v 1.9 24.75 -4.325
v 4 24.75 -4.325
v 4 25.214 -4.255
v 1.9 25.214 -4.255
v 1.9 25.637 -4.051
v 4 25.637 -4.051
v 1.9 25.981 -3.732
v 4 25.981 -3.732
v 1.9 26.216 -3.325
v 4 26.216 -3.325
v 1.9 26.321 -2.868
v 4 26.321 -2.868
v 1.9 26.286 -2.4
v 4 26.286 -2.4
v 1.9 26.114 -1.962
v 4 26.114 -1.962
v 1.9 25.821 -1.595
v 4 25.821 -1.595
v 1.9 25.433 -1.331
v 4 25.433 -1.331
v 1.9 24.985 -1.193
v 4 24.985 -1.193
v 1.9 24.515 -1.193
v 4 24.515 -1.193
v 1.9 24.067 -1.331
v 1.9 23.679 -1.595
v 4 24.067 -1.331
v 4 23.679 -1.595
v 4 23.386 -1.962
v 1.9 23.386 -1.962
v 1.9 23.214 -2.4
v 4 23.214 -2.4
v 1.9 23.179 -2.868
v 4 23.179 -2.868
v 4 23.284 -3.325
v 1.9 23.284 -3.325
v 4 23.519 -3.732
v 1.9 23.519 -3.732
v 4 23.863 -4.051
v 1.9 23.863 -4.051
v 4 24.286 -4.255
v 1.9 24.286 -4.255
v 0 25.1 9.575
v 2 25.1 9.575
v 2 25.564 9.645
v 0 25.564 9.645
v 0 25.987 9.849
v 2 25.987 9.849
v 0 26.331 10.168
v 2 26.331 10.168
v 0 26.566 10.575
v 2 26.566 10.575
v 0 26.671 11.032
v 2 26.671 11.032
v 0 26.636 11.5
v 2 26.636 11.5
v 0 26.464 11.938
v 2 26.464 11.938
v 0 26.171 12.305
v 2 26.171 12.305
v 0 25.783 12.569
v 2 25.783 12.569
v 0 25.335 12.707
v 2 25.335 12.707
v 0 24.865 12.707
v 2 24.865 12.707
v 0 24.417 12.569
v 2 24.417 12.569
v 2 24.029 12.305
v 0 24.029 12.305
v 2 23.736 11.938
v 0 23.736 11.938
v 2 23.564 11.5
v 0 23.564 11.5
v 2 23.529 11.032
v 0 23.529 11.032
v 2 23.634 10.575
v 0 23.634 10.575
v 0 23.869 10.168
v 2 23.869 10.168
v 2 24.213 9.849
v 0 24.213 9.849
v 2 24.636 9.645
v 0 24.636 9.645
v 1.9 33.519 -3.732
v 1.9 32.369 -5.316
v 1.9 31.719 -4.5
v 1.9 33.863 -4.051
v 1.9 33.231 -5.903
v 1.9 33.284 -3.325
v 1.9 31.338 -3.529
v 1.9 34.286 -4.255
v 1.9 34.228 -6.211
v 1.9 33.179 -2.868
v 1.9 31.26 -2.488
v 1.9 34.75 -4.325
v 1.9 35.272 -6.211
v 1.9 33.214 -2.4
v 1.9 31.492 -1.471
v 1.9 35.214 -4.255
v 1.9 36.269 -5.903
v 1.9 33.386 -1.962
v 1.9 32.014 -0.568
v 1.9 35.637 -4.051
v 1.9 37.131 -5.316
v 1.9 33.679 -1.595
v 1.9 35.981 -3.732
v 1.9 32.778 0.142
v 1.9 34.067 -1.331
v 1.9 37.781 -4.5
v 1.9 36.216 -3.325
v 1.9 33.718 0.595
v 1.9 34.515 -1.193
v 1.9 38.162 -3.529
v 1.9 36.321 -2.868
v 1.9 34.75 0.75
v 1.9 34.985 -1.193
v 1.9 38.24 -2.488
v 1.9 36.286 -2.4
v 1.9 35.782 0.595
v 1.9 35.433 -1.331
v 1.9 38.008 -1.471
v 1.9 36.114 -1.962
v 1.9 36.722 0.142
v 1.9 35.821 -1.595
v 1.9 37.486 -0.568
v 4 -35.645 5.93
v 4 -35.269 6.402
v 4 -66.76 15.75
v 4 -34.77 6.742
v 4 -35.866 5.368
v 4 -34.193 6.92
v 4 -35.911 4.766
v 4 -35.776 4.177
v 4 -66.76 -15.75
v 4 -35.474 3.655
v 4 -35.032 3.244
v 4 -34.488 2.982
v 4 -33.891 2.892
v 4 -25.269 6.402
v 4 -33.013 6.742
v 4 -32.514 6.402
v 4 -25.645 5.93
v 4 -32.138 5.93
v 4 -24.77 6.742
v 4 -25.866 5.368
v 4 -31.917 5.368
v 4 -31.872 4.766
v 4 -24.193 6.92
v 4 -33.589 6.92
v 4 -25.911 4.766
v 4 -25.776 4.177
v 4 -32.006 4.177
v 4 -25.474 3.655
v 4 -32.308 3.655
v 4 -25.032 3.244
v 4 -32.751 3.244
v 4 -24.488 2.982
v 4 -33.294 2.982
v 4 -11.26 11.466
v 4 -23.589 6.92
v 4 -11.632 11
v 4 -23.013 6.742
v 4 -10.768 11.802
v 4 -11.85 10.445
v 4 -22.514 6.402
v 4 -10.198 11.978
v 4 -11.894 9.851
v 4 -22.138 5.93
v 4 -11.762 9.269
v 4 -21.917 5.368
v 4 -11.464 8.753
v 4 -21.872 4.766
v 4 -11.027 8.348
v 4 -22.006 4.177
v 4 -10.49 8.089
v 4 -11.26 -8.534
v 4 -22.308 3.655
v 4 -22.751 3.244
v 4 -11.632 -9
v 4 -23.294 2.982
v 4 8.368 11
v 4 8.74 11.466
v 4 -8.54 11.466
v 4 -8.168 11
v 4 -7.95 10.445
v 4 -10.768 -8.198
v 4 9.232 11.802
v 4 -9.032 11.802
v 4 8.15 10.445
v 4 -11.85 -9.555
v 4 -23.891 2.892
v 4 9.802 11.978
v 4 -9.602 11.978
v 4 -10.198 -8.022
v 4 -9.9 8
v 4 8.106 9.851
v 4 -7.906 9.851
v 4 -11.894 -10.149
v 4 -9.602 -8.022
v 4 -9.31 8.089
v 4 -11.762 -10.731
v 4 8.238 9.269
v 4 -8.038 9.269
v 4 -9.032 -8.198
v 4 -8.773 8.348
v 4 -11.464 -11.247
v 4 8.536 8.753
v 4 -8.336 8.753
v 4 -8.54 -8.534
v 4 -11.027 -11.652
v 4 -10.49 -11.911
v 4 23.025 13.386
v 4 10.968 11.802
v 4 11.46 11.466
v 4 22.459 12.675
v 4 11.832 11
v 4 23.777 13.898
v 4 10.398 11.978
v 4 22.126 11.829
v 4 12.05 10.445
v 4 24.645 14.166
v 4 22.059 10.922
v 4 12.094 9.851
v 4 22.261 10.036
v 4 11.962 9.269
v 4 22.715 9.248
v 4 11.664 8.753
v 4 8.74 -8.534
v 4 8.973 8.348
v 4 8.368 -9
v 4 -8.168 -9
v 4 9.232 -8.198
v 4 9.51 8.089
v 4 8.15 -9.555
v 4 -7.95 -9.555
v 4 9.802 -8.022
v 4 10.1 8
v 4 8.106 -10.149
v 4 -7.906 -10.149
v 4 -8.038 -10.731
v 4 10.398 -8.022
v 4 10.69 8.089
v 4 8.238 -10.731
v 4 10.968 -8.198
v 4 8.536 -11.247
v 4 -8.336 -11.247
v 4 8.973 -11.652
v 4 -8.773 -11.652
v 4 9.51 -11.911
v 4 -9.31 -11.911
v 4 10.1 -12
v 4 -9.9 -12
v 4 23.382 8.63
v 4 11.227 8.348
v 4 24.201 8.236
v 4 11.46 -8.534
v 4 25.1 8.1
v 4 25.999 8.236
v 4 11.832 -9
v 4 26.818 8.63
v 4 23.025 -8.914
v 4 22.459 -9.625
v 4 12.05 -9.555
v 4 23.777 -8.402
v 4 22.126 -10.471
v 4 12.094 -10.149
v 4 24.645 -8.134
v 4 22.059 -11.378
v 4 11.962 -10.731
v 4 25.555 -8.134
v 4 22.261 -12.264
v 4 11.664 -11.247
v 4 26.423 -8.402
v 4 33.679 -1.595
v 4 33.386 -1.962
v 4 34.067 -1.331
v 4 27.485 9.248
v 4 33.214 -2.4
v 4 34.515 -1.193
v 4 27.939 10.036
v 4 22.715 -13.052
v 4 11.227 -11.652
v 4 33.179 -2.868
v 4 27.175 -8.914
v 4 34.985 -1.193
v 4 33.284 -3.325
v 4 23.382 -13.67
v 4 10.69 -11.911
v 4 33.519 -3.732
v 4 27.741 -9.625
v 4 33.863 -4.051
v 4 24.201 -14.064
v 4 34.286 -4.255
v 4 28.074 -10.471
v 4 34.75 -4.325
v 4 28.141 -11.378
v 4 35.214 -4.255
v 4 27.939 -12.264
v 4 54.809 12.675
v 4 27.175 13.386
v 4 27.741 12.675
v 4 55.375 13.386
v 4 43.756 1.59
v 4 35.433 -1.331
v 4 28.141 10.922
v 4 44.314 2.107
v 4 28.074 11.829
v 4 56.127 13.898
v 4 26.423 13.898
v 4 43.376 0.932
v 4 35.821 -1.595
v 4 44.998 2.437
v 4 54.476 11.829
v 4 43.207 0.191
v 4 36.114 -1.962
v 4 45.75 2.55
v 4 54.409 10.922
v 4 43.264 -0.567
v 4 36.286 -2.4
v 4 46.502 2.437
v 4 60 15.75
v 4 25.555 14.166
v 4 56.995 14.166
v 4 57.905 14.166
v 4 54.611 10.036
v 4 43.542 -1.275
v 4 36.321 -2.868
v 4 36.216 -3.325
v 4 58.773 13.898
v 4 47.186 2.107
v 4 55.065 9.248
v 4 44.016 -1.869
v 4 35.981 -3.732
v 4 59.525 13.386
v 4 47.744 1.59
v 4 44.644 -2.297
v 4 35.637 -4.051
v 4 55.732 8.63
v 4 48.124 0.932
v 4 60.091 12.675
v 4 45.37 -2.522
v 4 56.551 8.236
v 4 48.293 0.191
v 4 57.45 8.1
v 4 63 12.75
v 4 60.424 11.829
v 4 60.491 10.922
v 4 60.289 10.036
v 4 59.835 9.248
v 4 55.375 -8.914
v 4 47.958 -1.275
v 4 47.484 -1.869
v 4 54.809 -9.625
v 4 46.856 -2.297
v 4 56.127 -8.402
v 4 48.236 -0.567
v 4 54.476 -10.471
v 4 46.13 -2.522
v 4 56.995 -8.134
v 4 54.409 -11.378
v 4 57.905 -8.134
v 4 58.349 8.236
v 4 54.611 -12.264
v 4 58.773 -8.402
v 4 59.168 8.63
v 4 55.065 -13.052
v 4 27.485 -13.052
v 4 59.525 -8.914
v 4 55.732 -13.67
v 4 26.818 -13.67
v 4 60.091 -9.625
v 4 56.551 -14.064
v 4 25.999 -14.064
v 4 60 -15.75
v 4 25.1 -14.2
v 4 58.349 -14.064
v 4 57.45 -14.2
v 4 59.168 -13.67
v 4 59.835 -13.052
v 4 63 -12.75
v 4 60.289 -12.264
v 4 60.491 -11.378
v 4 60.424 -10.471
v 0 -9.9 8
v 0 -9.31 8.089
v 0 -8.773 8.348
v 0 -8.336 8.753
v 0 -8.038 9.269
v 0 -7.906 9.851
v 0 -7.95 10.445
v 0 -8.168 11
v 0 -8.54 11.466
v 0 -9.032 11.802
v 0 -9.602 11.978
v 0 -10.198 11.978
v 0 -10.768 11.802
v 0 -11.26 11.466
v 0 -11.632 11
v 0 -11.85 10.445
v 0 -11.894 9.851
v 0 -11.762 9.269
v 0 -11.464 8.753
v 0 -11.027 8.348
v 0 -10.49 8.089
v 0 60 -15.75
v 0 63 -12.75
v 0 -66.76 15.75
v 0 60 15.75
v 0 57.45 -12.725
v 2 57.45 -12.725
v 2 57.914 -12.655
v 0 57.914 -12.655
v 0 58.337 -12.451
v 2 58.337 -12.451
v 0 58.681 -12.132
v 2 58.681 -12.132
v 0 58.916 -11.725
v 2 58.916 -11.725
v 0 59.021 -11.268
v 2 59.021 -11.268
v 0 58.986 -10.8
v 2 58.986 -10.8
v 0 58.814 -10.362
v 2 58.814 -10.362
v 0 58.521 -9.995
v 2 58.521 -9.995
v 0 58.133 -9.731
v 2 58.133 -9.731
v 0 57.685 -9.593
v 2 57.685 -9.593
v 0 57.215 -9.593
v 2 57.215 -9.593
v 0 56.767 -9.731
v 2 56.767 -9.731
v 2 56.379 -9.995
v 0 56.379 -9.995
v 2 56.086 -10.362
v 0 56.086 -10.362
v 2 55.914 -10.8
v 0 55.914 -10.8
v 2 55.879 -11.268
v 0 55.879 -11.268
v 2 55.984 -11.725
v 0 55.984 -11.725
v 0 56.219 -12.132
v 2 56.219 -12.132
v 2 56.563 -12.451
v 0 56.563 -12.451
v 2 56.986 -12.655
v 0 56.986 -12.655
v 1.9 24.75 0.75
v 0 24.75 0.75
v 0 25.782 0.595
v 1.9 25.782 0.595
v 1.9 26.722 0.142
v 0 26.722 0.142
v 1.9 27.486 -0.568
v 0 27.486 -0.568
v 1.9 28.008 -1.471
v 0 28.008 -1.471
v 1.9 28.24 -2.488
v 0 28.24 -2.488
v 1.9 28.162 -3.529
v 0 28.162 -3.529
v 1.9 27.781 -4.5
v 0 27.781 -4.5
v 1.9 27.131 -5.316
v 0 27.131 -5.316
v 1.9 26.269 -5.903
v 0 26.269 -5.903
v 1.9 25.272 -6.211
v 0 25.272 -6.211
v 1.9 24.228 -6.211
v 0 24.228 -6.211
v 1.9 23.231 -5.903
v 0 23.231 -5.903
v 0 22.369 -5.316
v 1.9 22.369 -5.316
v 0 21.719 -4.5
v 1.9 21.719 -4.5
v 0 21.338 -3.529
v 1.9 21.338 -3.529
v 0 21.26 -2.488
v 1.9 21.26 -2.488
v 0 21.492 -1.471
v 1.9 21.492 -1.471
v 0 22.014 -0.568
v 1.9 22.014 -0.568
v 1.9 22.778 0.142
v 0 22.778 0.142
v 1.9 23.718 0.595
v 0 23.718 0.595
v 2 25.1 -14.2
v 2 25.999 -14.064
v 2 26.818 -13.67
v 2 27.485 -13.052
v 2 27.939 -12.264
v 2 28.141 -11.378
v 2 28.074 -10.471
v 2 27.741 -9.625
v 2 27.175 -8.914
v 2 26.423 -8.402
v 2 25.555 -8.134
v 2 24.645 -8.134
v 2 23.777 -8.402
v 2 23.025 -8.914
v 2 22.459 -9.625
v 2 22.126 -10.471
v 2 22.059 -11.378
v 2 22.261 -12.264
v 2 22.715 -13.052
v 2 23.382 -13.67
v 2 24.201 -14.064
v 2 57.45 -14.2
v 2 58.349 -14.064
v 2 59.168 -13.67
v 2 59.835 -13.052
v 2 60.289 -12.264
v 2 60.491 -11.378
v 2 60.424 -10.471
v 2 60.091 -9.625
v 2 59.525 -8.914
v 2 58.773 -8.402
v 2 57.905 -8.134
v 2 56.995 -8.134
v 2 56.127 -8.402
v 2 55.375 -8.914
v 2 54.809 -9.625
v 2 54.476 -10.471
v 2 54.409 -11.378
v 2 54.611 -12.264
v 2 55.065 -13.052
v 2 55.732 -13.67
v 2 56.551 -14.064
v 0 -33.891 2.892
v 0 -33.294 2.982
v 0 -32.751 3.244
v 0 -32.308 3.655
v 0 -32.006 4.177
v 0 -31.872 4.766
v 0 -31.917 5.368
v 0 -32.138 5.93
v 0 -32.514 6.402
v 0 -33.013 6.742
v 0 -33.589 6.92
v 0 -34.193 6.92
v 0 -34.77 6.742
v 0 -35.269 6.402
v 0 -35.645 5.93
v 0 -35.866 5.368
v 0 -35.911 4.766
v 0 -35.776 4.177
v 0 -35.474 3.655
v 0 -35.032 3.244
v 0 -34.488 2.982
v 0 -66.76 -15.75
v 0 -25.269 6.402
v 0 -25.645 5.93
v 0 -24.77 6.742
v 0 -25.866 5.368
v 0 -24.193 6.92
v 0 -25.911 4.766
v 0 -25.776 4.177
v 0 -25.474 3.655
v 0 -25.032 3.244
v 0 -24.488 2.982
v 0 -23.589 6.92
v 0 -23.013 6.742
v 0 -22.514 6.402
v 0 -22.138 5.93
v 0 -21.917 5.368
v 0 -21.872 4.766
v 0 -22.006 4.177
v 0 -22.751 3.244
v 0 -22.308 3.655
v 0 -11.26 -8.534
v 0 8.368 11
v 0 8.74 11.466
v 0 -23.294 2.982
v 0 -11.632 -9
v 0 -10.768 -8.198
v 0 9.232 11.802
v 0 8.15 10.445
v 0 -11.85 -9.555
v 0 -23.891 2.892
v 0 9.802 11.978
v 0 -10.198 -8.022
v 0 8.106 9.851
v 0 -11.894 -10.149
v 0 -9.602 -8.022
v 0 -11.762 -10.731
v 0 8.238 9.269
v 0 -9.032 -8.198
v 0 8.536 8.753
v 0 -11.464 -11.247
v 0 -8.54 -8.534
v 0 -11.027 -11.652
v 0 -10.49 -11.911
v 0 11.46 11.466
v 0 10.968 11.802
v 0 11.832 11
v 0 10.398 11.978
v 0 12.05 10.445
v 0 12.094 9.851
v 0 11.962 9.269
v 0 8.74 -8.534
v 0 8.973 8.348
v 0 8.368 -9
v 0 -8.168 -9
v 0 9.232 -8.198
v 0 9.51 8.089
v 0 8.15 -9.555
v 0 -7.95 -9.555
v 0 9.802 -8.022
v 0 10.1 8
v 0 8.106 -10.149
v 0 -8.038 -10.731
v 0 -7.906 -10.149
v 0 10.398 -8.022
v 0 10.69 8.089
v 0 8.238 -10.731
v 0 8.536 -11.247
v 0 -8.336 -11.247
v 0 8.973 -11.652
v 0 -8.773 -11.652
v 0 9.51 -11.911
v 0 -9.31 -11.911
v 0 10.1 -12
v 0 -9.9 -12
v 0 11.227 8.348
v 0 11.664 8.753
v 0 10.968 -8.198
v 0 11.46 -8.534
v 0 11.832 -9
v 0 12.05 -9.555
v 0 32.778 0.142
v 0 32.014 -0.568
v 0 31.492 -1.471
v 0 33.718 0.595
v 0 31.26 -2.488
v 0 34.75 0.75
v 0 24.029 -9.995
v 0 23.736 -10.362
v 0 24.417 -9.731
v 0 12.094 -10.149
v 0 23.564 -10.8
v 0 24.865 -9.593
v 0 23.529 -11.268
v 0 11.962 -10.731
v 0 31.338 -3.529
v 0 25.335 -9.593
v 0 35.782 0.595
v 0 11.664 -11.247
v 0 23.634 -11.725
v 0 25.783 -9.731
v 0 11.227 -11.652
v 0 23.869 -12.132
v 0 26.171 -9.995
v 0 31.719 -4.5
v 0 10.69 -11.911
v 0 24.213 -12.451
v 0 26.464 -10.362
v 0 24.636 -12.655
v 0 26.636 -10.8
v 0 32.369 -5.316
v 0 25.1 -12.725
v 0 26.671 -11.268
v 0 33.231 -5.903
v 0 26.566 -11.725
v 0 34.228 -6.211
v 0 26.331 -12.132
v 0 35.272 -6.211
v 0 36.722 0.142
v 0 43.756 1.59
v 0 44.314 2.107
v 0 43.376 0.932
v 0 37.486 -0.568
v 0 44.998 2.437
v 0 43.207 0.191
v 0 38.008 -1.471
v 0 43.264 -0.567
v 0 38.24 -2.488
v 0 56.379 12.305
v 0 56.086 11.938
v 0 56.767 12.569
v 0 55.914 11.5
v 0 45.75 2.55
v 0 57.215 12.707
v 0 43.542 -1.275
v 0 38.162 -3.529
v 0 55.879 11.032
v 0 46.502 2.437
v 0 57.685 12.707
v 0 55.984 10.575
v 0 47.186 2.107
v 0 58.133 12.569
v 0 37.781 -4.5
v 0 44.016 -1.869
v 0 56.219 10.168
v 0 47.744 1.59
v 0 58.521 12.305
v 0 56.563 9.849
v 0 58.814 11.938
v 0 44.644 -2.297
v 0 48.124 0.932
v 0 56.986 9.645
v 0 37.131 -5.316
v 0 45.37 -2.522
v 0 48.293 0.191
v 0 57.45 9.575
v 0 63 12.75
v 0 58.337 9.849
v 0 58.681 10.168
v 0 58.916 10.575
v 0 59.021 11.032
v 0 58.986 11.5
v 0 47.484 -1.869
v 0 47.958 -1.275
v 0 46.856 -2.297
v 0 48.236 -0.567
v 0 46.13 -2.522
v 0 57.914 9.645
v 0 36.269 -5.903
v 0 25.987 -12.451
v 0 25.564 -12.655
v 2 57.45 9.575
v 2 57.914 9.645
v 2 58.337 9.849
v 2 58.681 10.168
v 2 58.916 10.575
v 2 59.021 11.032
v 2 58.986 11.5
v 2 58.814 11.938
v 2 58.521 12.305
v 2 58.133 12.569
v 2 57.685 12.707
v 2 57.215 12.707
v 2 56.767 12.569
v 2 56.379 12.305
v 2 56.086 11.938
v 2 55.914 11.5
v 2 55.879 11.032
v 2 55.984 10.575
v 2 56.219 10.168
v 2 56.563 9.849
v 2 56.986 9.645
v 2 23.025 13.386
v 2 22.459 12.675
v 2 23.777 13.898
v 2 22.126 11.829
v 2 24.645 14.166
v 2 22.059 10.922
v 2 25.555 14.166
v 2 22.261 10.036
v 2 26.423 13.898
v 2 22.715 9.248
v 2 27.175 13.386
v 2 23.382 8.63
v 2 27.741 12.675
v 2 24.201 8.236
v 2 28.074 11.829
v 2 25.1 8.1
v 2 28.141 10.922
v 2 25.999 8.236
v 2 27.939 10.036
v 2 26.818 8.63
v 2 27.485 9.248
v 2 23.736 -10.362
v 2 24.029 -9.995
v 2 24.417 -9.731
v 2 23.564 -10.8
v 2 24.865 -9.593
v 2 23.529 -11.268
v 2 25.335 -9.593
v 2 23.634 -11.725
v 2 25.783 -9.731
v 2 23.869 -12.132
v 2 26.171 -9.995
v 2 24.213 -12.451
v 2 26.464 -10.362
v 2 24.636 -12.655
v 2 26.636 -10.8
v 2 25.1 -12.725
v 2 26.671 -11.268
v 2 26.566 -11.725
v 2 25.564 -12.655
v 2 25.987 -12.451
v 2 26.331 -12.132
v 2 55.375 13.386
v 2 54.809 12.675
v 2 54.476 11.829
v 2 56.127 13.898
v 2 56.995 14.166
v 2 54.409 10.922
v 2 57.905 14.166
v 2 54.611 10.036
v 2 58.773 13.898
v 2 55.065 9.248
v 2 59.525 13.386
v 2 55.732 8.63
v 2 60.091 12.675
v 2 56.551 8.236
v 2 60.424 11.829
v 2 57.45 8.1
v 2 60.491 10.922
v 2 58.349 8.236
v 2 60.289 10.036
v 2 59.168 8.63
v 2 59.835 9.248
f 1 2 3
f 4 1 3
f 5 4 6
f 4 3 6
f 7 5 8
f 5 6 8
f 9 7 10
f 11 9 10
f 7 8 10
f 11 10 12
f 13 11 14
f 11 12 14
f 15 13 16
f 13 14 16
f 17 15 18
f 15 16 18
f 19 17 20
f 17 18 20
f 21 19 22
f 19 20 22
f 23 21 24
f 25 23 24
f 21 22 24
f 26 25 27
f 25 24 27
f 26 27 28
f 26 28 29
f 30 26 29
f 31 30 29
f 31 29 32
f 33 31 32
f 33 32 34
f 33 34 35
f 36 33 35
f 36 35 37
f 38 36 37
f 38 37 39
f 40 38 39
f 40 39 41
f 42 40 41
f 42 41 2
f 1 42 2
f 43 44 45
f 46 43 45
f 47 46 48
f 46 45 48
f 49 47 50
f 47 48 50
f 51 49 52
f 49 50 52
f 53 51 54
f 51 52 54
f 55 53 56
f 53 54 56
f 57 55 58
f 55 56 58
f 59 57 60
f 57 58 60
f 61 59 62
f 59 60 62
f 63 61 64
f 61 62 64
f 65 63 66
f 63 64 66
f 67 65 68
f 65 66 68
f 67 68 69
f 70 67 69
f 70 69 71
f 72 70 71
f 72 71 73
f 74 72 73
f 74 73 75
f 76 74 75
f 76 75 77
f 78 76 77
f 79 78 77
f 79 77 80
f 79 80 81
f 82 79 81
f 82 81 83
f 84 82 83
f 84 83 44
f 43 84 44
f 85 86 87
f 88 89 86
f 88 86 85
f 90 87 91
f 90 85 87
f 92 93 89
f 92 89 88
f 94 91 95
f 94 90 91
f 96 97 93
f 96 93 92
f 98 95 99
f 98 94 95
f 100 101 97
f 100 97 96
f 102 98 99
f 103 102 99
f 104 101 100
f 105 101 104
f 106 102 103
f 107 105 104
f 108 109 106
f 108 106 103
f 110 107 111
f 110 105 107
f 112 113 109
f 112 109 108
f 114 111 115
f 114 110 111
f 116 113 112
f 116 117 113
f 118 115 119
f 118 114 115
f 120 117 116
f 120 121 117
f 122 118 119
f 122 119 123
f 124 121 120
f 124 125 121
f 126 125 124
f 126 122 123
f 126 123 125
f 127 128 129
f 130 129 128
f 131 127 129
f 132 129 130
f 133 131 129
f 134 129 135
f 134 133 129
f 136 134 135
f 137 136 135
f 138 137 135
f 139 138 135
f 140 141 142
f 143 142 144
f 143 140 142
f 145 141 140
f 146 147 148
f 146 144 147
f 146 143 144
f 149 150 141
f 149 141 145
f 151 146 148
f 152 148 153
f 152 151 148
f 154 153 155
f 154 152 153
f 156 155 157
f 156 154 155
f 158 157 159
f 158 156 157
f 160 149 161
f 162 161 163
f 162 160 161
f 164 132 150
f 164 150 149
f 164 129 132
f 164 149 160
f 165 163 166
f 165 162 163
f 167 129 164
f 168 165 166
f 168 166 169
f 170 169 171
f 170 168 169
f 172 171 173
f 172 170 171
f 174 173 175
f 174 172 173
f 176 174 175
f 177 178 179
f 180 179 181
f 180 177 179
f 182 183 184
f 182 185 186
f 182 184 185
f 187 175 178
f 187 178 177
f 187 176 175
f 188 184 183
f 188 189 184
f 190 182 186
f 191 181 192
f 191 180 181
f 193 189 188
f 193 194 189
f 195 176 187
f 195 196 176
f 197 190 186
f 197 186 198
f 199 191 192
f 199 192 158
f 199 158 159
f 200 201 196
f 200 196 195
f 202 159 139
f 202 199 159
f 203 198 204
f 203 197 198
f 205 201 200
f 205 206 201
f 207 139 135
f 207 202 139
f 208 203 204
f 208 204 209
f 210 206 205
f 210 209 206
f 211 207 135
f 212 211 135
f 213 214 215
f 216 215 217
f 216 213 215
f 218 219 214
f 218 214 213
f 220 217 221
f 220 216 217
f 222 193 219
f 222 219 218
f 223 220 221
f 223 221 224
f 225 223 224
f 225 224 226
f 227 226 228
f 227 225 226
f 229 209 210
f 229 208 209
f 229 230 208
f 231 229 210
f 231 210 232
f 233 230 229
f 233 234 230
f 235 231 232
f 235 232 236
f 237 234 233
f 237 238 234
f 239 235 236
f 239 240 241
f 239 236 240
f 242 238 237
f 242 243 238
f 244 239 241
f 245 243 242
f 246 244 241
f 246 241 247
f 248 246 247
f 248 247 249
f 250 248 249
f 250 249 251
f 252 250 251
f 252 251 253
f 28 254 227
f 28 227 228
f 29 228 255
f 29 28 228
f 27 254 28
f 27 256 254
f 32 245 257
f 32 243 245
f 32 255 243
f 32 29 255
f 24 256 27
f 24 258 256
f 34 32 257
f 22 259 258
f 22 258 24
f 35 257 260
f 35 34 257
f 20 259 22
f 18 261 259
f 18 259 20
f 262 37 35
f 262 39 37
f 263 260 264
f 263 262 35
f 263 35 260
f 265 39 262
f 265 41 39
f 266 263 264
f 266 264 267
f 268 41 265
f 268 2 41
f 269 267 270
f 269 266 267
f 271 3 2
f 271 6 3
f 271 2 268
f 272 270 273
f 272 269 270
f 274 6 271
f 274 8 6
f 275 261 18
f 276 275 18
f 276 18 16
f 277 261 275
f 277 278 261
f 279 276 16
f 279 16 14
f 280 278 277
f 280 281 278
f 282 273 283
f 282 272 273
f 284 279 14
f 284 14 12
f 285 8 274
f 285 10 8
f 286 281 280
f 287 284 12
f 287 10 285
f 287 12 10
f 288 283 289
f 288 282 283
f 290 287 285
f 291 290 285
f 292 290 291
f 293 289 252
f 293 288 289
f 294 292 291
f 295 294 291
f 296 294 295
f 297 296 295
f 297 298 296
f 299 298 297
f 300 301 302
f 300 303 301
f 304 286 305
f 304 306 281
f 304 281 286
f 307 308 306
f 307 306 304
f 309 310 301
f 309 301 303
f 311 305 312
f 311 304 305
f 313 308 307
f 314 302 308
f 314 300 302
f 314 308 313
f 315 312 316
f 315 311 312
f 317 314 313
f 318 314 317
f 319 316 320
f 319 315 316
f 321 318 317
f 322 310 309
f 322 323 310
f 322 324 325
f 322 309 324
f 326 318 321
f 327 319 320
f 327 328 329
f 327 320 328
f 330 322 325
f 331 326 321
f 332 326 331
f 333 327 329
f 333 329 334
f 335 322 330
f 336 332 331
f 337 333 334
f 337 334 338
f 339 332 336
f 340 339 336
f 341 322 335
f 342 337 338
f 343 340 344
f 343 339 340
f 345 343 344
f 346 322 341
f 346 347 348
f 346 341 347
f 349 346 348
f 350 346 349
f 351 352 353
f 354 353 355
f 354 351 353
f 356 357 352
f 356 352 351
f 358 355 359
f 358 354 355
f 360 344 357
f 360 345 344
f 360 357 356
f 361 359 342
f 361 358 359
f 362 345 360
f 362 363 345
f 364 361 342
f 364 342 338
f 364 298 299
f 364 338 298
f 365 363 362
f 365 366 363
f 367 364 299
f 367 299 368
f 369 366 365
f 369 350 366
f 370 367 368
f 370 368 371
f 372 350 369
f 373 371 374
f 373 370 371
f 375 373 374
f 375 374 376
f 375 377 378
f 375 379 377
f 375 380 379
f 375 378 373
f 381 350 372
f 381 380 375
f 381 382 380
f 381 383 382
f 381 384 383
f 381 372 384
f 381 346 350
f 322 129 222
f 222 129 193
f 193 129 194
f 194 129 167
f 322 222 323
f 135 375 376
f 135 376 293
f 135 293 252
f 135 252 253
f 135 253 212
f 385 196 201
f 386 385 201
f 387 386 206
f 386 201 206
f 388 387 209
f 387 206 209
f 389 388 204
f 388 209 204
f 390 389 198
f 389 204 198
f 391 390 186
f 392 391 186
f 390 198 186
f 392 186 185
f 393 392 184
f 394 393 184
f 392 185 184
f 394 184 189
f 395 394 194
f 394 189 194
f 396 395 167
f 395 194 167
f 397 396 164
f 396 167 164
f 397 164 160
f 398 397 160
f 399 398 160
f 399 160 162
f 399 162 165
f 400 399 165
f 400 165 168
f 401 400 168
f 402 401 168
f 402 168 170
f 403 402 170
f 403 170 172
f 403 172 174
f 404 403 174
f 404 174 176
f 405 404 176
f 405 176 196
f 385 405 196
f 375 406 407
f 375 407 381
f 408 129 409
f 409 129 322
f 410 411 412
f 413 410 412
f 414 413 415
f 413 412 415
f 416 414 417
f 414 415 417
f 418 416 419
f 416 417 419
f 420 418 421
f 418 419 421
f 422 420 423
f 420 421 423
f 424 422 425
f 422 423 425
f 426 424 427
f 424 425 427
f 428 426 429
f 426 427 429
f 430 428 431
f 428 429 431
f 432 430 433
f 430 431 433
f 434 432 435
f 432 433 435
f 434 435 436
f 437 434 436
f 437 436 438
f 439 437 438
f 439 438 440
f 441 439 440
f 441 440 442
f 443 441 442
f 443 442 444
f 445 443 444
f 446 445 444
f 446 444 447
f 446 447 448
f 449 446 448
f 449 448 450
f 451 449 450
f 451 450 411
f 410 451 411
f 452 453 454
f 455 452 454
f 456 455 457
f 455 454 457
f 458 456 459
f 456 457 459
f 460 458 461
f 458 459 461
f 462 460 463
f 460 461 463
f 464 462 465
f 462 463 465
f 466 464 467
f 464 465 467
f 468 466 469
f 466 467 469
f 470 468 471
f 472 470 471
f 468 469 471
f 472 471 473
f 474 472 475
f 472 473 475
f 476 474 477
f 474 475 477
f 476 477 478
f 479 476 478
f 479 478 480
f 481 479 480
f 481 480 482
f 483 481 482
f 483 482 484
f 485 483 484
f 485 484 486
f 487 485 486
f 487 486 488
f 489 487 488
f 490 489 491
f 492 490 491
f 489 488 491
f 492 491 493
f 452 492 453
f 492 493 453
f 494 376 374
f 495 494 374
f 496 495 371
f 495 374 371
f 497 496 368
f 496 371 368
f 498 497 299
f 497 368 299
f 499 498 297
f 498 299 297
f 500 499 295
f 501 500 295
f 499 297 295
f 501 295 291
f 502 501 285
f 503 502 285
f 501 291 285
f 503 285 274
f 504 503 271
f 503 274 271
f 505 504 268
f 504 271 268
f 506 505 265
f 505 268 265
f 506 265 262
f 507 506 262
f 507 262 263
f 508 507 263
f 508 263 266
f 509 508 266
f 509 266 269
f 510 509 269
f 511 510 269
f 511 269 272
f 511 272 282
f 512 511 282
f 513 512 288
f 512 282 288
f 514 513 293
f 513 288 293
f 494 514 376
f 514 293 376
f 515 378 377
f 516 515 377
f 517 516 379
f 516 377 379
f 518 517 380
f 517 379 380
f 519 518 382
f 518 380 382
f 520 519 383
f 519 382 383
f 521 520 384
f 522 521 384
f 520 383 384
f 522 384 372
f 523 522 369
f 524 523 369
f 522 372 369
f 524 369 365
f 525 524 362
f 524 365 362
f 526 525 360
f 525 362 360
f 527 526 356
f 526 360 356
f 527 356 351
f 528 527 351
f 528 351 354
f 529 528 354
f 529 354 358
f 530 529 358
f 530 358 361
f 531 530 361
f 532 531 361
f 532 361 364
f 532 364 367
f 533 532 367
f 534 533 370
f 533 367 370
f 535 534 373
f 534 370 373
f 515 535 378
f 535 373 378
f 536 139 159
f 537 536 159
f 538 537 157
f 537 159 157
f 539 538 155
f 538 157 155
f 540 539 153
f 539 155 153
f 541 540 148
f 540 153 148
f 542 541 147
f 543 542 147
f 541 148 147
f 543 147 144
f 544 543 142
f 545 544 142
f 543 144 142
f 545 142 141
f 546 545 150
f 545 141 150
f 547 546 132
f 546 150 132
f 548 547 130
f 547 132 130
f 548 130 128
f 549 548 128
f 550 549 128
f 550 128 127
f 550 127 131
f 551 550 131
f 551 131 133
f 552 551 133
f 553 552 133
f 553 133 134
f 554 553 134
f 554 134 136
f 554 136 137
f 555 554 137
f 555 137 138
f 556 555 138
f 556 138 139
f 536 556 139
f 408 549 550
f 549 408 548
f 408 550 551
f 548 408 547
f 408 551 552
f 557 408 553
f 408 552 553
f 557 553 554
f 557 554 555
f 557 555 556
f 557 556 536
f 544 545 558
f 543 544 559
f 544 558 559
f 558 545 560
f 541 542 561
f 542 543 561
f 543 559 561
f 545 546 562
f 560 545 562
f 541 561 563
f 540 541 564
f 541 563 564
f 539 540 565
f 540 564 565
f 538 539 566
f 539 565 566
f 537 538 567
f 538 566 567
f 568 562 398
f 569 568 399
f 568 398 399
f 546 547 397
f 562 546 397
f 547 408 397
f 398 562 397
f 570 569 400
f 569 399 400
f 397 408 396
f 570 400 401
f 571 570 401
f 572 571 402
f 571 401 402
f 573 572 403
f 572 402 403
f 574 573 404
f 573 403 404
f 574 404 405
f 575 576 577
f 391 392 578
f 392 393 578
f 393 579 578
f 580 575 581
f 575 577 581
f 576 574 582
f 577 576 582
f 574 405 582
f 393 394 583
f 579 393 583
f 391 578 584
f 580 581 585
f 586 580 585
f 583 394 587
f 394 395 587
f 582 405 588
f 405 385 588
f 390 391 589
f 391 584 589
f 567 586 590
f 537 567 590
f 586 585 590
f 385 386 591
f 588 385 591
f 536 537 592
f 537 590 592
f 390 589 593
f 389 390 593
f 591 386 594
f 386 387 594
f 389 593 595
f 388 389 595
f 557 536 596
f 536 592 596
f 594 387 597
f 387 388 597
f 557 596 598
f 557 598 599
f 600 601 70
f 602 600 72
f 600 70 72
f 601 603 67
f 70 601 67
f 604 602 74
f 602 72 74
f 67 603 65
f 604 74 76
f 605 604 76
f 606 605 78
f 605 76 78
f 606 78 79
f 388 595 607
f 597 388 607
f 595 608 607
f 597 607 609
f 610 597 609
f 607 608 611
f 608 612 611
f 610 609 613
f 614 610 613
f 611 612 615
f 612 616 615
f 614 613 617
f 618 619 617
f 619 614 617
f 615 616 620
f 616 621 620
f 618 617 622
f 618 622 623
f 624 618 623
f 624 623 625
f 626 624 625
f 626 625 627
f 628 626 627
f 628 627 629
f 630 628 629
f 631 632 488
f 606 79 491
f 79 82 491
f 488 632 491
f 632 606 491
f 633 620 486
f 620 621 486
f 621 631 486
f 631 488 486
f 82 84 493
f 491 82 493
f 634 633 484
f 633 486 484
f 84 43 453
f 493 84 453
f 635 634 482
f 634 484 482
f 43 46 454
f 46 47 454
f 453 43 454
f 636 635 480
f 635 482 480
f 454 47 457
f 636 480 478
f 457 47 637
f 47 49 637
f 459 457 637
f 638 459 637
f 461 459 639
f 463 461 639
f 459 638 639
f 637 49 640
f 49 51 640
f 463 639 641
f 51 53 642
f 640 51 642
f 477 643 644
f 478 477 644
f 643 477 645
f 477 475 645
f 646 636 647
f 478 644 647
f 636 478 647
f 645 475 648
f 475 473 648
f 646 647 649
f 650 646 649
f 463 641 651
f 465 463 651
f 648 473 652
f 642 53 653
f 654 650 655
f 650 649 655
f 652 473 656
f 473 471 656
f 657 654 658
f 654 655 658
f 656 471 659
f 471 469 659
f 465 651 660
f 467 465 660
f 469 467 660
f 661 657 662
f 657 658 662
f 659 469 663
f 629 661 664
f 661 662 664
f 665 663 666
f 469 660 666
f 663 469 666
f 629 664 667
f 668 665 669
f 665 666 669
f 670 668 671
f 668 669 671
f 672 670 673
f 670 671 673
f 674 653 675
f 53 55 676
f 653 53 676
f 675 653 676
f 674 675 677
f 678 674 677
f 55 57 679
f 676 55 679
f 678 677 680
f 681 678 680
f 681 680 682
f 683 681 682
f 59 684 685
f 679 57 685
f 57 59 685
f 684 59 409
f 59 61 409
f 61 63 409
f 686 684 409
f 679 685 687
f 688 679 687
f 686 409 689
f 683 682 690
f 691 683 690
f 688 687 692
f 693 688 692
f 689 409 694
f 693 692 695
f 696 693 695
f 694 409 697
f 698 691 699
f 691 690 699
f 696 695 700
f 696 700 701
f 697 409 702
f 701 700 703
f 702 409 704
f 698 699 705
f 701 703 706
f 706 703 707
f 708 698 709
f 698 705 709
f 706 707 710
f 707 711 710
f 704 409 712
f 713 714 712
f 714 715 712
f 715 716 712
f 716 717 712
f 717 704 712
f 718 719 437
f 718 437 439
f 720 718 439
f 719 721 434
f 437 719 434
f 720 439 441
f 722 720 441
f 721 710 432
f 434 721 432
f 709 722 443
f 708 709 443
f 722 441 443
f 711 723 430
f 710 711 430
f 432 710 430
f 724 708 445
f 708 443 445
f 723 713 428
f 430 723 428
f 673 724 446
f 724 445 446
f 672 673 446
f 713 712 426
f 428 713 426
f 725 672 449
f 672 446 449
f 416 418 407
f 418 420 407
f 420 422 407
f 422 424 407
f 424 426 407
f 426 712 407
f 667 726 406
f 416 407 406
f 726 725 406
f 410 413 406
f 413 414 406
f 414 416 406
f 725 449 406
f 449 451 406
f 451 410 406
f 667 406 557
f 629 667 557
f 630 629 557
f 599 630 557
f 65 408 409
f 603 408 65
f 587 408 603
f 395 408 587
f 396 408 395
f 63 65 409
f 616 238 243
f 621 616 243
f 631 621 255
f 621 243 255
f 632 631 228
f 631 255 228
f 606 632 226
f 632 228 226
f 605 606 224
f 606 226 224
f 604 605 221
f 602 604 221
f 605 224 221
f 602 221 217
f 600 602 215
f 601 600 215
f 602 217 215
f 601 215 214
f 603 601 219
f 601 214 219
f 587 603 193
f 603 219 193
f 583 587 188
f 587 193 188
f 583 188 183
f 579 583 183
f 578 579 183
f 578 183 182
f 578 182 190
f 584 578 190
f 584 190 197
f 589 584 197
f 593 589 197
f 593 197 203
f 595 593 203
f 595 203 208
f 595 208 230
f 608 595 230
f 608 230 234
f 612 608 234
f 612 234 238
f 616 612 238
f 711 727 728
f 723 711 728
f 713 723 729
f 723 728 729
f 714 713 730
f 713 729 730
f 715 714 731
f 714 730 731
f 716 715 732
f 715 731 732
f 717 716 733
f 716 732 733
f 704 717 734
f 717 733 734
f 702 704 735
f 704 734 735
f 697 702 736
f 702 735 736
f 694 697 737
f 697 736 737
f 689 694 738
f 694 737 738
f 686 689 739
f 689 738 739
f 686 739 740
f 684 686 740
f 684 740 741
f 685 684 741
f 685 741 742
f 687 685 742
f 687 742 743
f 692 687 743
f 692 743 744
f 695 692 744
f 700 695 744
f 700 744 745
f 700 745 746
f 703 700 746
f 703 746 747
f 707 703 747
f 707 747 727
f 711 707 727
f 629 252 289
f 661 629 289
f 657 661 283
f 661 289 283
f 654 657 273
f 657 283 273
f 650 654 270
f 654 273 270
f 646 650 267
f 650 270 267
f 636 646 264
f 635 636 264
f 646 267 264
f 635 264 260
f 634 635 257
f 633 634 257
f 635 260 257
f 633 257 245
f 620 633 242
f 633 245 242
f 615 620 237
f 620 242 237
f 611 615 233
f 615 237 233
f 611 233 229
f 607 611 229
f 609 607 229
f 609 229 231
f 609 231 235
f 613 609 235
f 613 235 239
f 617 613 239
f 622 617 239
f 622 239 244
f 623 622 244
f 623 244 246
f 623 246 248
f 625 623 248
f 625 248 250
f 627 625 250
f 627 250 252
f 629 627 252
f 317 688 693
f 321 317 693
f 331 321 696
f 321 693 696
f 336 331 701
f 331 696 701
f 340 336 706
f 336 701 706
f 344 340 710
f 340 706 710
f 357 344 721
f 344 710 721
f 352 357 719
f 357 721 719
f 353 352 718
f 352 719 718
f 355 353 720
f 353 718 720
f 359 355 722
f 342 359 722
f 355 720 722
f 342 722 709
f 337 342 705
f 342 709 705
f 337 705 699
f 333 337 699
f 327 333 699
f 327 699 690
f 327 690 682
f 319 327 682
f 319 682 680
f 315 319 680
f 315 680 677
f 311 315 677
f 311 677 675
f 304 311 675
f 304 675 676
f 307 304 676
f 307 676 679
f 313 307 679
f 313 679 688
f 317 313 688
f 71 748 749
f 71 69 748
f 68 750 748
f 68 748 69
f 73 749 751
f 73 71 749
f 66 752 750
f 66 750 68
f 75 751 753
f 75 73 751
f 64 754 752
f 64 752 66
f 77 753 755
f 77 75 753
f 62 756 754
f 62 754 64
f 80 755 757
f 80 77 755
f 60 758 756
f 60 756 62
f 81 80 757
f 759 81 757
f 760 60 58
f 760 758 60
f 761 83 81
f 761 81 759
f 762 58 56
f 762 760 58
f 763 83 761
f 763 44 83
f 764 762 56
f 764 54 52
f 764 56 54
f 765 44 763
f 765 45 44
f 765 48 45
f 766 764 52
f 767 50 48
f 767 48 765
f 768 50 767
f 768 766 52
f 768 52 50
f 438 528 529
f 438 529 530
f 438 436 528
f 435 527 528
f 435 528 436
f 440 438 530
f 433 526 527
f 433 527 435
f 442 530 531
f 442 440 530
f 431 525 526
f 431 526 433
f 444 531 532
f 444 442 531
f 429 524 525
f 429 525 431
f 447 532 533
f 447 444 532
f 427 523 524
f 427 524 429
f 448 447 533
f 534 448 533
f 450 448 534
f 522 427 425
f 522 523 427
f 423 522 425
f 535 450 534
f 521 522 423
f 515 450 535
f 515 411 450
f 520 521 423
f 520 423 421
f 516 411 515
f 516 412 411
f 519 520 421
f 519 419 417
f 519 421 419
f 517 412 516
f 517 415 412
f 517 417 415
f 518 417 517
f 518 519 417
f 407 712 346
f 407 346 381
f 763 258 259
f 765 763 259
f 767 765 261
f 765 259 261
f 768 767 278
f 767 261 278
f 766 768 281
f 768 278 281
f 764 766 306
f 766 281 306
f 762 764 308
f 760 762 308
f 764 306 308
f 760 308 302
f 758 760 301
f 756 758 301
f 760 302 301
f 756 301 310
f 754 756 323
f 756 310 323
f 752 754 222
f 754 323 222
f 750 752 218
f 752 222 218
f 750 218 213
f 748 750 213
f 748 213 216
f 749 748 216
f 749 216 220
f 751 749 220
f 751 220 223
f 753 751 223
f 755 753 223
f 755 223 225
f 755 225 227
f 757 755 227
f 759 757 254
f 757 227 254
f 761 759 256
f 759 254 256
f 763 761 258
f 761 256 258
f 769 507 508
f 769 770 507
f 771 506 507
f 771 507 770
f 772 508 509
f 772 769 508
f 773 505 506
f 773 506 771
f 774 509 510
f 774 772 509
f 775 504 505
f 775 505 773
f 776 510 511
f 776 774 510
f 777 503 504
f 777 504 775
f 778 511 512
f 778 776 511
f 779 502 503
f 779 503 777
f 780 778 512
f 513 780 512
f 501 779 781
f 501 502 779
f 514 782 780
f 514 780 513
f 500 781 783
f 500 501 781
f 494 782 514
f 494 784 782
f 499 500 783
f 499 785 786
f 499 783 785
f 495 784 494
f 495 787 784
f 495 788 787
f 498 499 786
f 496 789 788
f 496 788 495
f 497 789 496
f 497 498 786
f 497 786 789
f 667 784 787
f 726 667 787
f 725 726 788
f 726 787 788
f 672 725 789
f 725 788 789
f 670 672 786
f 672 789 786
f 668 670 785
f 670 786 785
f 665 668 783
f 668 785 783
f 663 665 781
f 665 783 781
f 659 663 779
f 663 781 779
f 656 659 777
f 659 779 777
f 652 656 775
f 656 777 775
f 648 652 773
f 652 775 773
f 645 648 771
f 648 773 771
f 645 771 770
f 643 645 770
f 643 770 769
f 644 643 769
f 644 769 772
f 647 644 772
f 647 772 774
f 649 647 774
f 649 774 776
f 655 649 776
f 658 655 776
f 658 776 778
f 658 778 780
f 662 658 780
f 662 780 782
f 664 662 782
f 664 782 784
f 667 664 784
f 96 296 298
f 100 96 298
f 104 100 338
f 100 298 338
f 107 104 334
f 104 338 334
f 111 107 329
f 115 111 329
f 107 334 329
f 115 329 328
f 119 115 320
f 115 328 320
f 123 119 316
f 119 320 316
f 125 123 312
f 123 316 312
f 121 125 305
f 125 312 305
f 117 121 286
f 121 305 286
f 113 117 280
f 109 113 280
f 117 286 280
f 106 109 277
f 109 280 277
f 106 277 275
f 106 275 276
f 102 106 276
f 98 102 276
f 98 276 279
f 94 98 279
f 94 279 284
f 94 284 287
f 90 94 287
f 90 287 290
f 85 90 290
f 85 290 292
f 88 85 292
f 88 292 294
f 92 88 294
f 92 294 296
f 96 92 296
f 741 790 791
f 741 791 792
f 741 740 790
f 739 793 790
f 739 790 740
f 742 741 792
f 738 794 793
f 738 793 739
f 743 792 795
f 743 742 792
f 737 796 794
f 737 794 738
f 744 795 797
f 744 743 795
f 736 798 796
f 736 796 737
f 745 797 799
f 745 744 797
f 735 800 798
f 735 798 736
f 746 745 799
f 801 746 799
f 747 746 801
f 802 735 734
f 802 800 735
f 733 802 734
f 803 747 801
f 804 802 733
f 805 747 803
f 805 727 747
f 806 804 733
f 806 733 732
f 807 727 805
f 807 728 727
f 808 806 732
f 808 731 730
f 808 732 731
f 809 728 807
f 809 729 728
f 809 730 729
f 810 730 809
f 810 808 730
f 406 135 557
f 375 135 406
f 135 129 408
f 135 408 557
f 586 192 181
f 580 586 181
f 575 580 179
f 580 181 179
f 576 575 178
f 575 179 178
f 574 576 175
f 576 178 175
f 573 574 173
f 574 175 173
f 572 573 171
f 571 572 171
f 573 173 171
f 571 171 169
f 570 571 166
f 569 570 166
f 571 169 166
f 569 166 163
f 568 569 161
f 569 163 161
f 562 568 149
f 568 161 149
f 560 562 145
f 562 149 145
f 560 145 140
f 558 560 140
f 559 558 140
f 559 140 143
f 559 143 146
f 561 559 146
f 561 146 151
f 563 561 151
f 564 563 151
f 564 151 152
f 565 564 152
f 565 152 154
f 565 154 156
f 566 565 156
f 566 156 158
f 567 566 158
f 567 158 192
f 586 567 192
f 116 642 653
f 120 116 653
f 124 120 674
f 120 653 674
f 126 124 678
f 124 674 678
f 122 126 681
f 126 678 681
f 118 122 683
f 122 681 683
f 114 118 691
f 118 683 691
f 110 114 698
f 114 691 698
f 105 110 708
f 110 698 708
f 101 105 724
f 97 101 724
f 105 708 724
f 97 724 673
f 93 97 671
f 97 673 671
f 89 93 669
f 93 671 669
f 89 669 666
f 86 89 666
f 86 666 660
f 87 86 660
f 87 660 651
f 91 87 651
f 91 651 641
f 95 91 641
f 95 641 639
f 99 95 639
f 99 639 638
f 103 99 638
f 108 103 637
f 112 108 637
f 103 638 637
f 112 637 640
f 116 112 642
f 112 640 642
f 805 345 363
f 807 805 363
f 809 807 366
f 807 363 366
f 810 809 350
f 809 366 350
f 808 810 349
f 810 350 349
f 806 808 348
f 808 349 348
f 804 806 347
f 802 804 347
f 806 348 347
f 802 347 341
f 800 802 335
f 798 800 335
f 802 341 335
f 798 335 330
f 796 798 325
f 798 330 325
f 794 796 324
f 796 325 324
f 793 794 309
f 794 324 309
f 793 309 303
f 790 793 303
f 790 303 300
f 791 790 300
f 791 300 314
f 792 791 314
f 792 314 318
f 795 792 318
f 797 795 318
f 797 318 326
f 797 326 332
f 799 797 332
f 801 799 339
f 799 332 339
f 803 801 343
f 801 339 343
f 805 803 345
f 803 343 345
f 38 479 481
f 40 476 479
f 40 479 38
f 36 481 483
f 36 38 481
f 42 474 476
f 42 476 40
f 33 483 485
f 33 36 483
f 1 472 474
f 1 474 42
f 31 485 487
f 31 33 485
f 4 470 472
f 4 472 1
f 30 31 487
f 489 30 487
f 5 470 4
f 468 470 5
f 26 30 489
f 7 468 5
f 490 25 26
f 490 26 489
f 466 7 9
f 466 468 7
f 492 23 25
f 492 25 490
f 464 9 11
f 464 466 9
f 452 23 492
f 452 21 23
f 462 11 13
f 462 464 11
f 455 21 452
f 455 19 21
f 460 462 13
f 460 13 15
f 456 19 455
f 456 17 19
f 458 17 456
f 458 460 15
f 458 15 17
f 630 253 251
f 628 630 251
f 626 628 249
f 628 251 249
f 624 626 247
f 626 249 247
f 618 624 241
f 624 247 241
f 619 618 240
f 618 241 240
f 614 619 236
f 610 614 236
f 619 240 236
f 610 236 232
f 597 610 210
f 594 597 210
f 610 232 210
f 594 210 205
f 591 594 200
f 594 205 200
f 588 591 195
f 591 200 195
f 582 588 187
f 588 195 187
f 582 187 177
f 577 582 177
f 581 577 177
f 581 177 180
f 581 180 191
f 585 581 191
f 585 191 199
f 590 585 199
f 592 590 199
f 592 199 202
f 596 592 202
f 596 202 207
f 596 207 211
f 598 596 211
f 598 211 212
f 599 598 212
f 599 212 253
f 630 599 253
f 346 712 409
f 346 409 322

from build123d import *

# Parameters (mm, degrees)
CROQUIS1_W              = 31.5
CROQUIS1_H              = 126
SALIENTE_EXTRUIR1_DEPTH = 4
CROQUIS3_R              = 2
CORTAR_EXTRUIR2_DEPTH   = 5
CROQUIS8_R              = 2.55
CORTAR_EXTRUIR3_DEPTH   = 5
CROQUIS11_R             = 1.575
CORTAR_EXTRUIR8_DEPTH   = 5
CROQUIS15_R             = 1.575
CORTAR_EXTRUIR11_DEPTH  = 5
CHAFL_N2_SIZE           = 3
CROQUIS19_R             = 3.5
CORTAR_EXTRUIR13_DEPTH  = 1.9
CROQUIS20_R             = 3.05
CORTAR_EXTRUIR14_DEPTH  = 2
CROQUIS24_W             = 31.5
CROQUIS24_H             = 3.76
SALIENTE_EXTRUIR3_DEPTH = 4
CROQUIS25_R             = 2.025
CORTAR_EXTRUIR15_DEPTH  = 5


with BuildPart() as part:
    # Croquis1 → Saliente-Extruir1 (new body)
    with BuildSketch(Plane(origin=(0, 0, 0), x_dir=(0, 0, -1), z_dir=(1, 0, 0))):
        Rectangle(CROQUIS1_W, CROQUIS1_H)
    extrude(amount=SALIENTE_EXTRUIR1_DEPTH)

    # Croquis3 → Cortar-Extruir2 (cut, through all)
    with BuildSketch(Plane(origin=(4, 0, 0), x_dir=(0, 0, -1), z_dir=(1, 0, 0))):
        with Locations((-10, 10.1)):
            Circle(CROQUIS3_R)
        with Locations((10, 10.1)):
            Circle(CROQUIS3_R)
        with Locations((-10, -9.9)):
            Circle(CROQUIS3_R)
        with Locations((10, -9.9)):
            Circle(CROQUIS3_R)
    extrude(amount=-CORTAR_EXTRUIR2_DEPTH, mode=Mode.SUBTRACT)

    # Croquis8 → Cortar-Extruir3 (cut, through all)
    with BuildSketch(Plane.ZY):
        with Locations((0, 45.75)):
            Circle(CROQUIS8_R)
    extrude(amount=-CORTAR_EXTRUIR3_DEPTH, mode=Mode.SUBTRACT)

    # Croquis11 → Cortar-Extruir8 (cut, through all)
    with BuildSketch(Plane(origin=(4, 0, 0), x_dir=(0, 0, -1), z_dir=(1, 0, 0))):
        with Locations((2.75, 34.75)):
            Circle(CROQUIS11_R)
        with Locations((2.75, 24.75)):
            Circle(CROQUIS11_R)
    extrude(amount=-CORTAR_EXTRUIR8_DEPTH, mode=Mode.SUBTRACT)

    # Croquis15 → Cortar-Extruir11 (cut, through all)
    with BuildSketch(Plane(origin=(4, 0, 0), x_dir=(0, 0, -1), z_dir=(1, 0, 0))):
        with Locations((-11.15, 57.45)):
            Circle(CROQUIS15_R)
        with Locations((11.15, 57.45)):
            Circle(CROQUIS15_R)
        with Locations((-11.15, 25.1)):
            Circle(CROQUIS15_R)
        with Locations((11.15, 25.1)):
            Circle(CROQUIS15_R)
    extrude(amount=-CORTAR_EXTRUIR11_DEPTH, mode=Mode.SUBTRACT)

    # Chaflán2
    chafl_n2_edges = [part.edges().sort_by_distance(p)[0] for p in [
        (2, 63, 15.75),
        (2, 63, -15.75),
    ]]
    chamfer(chafl_n2_edges, length=CHAFL_N2_SIZE)

    # Croquis19 → Cortar-Extruir13 (cut)
    with BuildSketch(Plane.ZY):
        with Locations((-2.75, 24.75)):
            Circle(CROQUIS19_R)
        with Locations((-2.75, 34.75)):
            Circle(CROQUIS19_R)
    extrude(amount=-CORTAR_EXTRUIR13_DEPTH, mode=Mode.SUBTRACT)

    # Croquis20 → Cortar-Extruir14 (cut)
    with BuildSketch(Plane(origin=(4, 0, 0), x_dir=(0, 0, -1), z_dir=(1, 0, 0))):
        with Locations((-11.15, 57.45)):
            Circle(CROQUIS20_R)
        with Locations((11.15, 57.45)):
            Circle(CROQUIS20_R)
        with Locations((11.15, 25.1)):
            Circle(CROQUIS20_R)
        with Locations((-11.15, 25.1)):
            Circle(CROQUIS20_R)
    extrude(amount=-CORTAR_EXTRUIR14_DEPTH, mode=Mode.SUBTRACT)

    # Croquis24 → Saliente-Extruir3 (add)
    with BuildSketch(Plane(origin=(4, 0, 0), x_dir=(0, 0, -1), z_dir=(1, 0, 0))):
        with Locations((0, -64.88)):
            Rectangle(CROQUIS24_W, CROQUIS24_H)
    extrude(amount=-SALIENTE_EXTRUIR3_DEPTH)

    # Croquis25 → Cortar-Extruir15 (cut, through all)
    with BuildSketch(Plane(origin=(4, 0, 0), x_dir=(0, 0, -1), z_dir=(1, 0, 0))):
        with Locations((-4.91726189, -23.891280092)):
            Circle(CROQUIS25_R)
        with Locations((-4.91726189, -33.891280092)):
            Circle(CROQUIS25_R)
    extrude(amount=-CORTAR_EXTRUIR15_DEPTH, mode=Mode.SUBTRACT)


solid = part.part
